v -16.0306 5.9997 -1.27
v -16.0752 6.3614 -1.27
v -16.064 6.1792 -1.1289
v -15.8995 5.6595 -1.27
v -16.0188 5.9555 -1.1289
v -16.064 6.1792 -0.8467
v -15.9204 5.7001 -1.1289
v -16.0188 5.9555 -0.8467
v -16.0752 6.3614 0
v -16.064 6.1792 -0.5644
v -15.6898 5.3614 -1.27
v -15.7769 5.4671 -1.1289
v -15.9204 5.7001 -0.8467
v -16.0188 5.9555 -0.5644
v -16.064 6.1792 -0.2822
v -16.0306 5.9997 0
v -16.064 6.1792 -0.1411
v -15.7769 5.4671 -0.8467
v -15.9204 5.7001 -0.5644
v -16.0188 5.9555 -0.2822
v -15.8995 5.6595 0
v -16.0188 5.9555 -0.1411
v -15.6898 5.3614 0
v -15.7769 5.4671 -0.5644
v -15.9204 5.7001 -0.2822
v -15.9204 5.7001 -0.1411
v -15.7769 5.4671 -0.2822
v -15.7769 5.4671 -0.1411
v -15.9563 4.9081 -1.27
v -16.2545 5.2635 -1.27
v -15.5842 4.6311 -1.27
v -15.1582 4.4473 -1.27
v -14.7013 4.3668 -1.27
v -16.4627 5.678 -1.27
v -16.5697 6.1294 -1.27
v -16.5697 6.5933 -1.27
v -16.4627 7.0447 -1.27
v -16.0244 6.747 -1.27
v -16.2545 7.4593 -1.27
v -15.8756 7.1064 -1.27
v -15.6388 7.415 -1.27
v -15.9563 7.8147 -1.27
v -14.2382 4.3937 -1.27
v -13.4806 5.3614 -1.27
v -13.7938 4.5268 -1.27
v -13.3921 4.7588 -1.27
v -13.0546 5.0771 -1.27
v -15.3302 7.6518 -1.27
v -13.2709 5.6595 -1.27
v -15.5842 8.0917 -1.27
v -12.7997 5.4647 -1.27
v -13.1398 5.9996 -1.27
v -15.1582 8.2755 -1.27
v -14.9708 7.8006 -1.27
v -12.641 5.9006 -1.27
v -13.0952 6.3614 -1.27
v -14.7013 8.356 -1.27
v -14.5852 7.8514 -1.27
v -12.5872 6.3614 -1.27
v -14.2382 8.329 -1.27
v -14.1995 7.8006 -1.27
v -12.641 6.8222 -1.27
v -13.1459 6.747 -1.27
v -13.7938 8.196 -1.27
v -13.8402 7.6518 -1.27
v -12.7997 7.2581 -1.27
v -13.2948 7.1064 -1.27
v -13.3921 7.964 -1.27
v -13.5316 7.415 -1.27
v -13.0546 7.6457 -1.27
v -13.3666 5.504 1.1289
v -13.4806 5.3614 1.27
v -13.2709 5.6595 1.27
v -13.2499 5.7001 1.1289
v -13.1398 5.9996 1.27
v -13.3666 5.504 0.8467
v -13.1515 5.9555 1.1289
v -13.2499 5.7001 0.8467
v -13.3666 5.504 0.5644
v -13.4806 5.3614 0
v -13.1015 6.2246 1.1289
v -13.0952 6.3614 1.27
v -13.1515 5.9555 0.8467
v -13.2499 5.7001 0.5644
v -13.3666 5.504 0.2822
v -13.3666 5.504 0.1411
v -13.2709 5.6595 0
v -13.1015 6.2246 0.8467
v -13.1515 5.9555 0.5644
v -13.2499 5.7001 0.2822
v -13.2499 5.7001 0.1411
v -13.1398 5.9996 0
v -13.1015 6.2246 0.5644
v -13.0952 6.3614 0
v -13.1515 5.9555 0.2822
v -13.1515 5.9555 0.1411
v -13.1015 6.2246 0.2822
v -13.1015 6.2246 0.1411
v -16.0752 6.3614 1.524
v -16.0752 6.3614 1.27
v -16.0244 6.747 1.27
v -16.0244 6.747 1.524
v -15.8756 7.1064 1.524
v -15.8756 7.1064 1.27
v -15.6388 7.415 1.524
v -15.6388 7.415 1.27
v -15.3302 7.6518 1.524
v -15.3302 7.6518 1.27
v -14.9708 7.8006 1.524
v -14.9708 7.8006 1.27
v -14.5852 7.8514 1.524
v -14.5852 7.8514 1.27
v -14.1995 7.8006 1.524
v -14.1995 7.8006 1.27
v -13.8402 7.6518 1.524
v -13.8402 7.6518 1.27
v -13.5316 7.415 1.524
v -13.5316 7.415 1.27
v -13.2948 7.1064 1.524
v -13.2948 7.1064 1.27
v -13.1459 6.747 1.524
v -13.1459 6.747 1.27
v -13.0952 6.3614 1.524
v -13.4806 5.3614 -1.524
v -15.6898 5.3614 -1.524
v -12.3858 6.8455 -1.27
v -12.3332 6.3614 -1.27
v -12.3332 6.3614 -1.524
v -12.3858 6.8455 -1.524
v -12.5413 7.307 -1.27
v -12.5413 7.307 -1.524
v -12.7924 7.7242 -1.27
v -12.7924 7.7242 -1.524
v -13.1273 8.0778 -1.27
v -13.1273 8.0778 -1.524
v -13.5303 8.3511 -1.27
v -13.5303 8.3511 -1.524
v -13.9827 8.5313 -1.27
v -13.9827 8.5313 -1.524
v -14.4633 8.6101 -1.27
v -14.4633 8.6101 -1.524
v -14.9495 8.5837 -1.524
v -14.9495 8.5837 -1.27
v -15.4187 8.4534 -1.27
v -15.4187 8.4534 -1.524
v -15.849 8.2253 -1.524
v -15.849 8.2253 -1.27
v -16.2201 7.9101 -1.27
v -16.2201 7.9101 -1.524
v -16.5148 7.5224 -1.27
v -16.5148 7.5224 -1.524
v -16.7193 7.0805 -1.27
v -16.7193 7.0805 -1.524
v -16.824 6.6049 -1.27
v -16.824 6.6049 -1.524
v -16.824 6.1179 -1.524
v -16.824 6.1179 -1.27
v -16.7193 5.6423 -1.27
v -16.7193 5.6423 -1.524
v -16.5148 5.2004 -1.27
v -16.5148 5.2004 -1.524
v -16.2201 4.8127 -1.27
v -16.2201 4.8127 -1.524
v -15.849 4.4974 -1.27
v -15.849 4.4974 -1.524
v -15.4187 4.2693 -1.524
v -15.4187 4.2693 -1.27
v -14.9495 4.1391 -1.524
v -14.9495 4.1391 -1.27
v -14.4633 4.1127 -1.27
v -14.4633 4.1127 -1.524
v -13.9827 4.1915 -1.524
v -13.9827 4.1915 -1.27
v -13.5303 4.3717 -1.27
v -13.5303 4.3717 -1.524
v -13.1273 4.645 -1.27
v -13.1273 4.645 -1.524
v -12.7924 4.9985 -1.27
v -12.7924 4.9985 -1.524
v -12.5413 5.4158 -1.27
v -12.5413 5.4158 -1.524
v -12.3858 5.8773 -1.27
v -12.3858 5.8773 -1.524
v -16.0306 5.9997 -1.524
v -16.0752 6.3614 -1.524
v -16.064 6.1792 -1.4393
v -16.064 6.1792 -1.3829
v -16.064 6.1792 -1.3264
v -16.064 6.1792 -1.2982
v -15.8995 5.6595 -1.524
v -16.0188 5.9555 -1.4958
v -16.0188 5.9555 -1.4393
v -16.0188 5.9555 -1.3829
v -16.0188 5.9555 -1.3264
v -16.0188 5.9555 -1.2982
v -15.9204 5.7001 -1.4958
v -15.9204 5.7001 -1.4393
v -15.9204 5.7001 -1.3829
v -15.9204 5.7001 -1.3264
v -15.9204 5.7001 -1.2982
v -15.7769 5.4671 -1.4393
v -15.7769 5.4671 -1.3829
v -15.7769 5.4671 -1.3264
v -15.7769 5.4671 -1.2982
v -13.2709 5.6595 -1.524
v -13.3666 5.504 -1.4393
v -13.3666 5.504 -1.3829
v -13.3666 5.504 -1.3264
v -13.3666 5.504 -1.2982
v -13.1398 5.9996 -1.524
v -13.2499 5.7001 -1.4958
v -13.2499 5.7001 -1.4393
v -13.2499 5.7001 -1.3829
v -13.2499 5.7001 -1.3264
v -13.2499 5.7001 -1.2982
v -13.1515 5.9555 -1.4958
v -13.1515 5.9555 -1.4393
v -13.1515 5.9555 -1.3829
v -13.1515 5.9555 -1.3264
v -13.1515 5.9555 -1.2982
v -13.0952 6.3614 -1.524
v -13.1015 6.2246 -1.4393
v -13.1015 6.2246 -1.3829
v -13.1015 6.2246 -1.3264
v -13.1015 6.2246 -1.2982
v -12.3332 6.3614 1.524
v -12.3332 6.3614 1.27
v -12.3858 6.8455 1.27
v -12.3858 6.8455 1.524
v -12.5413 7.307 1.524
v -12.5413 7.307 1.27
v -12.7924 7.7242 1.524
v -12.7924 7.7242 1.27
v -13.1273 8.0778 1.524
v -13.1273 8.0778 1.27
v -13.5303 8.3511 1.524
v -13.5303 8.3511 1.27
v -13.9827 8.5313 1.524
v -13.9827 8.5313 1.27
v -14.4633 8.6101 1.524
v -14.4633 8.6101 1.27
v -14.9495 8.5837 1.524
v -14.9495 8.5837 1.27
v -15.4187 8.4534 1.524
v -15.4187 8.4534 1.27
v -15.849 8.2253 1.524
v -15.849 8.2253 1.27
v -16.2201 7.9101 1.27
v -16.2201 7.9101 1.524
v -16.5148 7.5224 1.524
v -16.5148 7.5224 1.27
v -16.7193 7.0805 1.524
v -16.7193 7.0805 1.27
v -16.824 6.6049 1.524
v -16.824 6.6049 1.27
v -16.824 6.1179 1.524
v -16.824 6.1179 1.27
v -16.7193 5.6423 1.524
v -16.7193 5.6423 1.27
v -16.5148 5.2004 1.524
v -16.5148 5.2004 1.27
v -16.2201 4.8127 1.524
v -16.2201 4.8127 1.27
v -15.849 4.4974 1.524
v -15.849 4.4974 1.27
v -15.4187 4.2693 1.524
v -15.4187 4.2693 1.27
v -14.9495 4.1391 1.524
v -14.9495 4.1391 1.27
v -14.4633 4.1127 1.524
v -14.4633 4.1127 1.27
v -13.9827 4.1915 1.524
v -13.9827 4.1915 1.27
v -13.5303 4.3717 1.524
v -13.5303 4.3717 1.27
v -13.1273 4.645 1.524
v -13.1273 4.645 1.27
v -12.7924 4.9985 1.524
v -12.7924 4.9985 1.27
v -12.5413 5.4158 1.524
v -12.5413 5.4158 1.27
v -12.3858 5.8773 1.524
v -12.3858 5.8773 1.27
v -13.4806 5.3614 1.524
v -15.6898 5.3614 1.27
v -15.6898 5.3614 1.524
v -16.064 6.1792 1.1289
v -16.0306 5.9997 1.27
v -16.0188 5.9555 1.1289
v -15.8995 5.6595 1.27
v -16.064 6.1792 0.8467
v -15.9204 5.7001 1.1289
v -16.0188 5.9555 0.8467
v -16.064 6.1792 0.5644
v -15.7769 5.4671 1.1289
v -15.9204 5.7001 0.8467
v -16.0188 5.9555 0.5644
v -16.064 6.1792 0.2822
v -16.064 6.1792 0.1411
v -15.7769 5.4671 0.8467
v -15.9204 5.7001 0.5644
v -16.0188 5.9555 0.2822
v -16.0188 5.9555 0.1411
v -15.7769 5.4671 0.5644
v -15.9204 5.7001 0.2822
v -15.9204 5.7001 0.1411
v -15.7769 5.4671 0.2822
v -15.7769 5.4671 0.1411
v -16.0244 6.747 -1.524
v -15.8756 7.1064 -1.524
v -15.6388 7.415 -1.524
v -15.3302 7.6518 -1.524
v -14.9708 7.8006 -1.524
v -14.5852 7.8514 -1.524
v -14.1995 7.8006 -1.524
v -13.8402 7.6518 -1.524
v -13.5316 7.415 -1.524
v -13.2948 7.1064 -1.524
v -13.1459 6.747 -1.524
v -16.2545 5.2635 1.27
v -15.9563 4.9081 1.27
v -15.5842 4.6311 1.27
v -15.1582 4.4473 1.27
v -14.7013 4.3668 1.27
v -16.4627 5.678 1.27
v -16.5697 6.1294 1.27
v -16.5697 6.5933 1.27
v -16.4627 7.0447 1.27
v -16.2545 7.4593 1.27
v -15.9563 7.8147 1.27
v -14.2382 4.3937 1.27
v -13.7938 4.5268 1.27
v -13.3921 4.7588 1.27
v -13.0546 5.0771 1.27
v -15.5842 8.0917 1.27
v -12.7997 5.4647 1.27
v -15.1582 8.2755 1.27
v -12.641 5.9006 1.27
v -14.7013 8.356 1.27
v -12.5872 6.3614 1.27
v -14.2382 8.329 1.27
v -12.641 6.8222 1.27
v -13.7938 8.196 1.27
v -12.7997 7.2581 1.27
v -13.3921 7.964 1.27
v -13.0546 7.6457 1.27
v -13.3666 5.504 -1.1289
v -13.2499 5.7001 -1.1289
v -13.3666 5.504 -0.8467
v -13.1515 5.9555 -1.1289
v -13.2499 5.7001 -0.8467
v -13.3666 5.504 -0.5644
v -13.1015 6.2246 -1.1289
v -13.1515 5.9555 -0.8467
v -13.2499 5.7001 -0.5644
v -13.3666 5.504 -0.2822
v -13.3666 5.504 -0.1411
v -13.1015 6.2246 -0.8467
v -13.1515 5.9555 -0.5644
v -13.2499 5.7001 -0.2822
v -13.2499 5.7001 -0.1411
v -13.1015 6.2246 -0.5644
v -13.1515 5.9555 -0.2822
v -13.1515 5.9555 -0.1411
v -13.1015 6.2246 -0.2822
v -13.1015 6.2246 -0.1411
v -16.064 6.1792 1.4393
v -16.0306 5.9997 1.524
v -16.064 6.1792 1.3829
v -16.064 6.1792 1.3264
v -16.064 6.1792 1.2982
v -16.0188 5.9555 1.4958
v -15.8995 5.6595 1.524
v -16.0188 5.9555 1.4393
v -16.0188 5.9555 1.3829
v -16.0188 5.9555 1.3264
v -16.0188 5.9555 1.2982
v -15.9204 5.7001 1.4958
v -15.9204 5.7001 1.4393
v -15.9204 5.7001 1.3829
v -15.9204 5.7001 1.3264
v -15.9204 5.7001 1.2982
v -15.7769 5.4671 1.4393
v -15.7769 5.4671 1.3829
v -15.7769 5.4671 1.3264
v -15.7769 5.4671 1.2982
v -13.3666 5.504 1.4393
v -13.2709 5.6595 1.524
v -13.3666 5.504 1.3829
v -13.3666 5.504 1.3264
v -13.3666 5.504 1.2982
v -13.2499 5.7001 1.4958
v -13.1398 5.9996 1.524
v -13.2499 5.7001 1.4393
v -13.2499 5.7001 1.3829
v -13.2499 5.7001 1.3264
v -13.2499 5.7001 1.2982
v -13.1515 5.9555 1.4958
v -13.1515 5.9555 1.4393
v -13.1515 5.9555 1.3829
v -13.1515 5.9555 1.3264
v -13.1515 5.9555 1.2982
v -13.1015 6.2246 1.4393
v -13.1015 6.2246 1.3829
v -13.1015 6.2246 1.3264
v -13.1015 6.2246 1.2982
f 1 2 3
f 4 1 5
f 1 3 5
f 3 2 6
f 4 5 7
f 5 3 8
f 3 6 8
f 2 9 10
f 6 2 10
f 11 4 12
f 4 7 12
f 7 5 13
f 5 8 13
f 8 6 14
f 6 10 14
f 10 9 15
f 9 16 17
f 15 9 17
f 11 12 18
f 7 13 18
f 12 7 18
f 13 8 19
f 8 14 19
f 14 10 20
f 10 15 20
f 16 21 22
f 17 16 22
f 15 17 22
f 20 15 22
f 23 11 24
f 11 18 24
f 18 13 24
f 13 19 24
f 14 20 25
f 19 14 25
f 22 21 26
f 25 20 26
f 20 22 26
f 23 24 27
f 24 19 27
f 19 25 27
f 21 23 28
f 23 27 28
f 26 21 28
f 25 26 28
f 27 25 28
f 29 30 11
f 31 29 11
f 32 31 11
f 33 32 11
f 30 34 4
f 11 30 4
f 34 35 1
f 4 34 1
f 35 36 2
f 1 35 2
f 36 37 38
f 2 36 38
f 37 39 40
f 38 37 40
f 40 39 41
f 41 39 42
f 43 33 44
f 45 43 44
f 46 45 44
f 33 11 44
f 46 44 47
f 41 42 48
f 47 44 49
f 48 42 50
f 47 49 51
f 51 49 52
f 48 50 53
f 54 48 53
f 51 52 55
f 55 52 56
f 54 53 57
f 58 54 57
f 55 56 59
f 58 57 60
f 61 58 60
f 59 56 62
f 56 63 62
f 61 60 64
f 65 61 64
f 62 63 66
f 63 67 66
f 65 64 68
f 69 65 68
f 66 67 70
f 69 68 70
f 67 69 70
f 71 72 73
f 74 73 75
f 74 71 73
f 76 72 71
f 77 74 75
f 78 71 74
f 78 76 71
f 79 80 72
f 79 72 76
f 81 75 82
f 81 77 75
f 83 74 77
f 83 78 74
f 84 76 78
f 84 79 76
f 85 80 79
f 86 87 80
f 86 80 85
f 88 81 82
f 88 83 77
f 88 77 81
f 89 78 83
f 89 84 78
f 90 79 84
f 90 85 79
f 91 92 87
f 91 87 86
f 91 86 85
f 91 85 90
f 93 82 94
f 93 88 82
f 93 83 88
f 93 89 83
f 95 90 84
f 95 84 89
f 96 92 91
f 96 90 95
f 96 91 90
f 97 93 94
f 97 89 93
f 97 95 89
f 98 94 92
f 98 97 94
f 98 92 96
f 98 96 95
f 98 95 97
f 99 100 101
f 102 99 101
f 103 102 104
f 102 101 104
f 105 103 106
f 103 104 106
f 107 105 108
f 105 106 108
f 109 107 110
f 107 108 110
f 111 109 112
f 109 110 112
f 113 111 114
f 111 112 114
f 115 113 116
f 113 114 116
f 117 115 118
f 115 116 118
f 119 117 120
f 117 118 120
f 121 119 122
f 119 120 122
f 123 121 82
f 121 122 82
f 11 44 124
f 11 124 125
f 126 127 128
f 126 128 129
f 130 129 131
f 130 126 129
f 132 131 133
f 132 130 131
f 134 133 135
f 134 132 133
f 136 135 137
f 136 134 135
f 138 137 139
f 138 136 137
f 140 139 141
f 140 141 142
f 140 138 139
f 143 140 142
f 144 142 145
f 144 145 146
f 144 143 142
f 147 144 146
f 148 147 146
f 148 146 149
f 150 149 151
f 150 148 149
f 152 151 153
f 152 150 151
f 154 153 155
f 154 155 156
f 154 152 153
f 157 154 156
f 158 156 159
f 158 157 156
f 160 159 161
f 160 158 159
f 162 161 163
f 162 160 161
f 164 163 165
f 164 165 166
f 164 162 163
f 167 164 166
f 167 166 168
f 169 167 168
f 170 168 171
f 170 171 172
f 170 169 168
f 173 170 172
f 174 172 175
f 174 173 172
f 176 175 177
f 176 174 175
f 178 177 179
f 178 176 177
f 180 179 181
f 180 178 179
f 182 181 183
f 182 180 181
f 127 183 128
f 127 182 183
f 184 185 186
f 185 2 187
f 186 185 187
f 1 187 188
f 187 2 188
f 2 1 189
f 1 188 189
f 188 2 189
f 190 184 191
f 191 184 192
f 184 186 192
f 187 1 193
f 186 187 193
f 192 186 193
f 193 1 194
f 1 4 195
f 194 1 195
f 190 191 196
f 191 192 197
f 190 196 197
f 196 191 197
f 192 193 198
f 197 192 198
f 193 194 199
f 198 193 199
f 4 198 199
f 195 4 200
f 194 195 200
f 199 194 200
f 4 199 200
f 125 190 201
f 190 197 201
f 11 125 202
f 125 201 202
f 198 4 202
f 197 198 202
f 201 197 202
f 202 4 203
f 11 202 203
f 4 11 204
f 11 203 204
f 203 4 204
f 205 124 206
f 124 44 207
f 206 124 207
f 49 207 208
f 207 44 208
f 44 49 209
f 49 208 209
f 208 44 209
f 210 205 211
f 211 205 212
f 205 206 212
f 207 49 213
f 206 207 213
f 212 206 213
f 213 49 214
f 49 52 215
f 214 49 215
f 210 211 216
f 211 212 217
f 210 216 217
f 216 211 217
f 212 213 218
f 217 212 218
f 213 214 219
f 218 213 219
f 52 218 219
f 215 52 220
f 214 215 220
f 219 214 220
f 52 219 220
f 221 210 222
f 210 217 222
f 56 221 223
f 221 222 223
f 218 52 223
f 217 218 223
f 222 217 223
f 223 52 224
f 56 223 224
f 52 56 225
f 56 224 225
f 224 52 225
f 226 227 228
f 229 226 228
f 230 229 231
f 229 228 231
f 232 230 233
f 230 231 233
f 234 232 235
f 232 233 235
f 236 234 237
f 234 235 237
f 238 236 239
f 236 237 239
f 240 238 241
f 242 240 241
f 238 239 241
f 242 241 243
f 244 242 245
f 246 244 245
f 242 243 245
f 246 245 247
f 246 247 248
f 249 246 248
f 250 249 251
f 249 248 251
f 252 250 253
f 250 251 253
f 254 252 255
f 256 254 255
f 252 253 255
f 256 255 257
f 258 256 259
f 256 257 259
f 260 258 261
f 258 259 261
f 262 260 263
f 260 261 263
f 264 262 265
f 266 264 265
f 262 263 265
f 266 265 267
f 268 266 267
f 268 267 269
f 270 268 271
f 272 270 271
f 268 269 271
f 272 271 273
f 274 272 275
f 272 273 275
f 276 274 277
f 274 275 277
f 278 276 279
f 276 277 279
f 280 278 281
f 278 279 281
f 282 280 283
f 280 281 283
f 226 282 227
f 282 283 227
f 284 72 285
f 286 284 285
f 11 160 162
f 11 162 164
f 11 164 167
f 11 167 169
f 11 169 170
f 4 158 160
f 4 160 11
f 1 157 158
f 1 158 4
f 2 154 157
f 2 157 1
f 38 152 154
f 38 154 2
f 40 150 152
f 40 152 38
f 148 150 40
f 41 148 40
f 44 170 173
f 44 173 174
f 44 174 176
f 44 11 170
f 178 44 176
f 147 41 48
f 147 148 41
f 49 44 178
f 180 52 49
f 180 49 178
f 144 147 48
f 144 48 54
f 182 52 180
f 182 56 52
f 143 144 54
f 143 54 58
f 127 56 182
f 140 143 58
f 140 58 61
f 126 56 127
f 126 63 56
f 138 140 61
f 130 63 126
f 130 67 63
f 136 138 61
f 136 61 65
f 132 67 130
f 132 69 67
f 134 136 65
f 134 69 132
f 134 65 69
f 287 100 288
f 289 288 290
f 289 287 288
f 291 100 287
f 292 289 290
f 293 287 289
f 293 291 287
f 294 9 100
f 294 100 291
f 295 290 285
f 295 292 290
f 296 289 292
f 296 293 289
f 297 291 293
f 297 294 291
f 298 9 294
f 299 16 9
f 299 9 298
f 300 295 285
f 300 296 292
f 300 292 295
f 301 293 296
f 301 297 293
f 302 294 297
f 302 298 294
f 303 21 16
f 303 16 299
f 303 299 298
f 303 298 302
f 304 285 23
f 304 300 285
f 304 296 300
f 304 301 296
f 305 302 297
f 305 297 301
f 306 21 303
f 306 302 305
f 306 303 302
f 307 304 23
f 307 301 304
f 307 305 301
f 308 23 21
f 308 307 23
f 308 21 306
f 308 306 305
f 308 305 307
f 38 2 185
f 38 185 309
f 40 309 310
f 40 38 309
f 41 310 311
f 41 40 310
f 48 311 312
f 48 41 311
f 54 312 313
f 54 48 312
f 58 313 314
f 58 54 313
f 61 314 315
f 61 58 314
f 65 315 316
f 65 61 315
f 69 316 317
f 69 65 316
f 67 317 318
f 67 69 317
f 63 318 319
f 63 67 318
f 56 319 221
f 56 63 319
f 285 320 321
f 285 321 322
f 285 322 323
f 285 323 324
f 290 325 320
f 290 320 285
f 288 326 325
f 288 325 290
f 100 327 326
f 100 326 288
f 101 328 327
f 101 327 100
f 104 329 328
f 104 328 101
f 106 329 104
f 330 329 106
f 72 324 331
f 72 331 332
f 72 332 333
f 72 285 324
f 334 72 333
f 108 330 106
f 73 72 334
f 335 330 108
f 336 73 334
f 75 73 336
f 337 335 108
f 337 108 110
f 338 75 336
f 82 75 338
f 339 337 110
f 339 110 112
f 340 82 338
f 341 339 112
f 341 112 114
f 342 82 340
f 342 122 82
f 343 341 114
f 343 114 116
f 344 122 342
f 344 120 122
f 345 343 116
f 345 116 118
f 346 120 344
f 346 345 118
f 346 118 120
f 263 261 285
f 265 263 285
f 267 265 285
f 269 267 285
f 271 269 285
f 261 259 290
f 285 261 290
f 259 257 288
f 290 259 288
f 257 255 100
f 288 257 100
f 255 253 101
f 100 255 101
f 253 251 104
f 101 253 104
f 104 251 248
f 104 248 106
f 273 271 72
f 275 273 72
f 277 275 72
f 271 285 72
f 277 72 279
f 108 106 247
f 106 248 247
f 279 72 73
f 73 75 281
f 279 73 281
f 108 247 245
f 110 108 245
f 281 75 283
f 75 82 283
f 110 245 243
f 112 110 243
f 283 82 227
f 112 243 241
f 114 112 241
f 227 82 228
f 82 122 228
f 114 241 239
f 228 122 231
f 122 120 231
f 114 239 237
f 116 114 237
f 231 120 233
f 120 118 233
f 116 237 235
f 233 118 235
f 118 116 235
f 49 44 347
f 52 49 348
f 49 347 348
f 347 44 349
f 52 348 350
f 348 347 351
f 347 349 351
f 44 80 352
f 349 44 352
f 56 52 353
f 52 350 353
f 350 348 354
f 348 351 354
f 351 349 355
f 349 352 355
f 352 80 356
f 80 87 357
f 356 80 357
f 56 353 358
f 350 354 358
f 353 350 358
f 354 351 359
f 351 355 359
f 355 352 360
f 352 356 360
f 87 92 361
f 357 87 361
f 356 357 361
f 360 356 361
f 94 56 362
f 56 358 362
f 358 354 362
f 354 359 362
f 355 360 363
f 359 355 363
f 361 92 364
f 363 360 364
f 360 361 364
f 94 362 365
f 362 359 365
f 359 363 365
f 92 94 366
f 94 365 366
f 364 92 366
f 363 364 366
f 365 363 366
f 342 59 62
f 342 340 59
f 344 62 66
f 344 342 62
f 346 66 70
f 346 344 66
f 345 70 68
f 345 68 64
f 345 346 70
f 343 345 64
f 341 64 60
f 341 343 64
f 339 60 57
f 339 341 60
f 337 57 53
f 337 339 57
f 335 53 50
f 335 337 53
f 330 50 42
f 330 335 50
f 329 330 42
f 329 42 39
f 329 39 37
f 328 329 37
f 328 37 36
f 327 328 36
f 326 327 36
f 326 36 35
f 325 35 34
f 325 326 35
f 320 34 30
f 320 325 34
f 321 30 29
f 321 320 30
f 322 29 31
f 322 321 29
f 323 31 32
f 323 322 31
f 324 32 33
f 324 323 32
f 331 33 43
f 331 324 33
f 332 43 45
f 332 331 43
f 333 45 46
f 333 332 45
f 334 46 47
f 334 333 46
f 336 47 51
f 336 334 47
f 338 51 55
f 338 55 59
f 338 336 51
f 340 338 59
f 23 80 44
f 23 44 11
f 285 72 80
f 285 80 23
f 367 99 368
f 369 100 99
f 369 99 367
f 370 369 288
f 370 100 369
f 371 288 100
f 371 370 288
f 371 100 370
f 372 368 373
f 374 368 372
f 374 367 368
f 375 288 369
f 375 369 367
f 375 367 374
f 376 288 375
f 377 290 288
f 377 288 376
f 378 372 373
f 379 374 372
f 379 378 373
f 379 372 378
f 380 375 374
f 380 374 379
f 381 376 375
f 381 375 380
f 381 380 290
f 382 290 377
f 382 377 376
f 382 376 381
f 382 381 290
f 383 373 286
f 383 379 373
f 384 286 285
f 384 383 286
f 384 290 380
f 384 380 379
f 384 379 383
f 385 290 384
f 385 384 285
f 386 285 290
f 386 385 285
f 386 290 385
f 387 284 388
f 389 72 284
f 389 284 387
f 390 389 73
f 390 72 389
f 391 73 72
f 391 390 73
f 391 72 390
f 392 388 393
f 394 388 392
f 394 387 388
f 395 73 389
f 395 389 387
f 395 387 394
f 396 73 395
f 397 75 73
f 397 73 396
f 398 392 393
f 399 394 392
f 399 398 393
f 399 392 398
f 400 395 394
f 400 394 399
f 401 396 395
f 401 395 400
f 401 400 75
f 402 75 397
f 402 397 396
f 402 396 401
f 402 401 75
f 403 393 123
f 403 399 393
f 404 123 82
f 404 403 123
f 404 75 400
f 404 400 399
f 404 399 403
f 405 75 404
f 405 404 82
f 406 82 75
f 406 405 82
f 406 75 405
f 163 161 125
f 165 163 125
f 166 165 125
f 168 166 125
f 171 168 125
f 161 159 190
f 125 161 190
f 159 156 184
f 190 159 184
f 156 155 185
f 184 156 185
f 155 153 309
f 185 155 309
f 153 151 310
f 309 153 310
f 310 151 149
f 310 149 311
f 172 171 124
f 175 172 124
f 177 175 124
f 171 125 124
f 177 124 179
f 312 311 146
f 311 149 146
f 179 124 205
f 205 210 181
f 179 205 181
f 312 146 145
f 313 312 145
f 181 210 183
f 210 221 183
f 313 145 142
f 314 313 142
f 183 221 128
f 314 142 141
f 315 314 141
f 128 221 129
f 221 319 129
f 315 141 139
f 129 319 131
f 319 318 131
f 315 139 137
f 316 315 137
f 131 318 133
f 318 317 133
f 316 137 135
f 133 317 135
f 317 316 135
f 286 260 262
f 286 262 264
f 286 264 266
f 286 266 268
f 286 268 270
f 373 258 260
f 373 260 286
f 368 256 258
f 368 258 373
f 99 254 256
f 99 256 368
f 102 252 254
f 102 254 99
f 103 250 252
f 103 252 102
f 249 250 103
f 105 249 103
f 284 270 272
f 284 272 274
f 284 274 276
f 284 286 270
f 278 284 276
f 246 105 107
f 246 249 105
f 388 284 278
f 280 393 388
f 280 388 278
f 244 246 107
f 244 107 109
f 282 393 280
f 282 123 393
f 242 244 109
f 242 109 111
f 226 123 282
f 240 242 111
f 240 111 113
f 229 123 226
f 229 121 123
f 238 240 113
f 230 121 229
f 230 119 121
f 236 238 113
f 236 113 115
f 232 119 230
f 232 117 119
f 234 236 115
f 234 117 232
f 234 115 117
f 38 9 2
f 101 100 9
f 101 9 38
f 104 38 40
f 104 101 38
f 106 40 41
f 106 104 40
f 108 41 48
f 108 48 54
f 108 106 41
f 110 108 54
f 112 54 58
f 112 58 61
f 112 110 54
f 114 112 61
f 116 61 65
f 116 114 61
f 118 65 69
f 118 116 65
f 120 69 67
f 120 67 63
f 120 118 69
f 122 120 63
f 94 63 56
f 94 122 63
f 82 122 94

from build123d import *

# Parameters (mm, degrees)
SKETCH1_R           = 1.997999999
BOSS_EXTRUDE1_DEPTH = 1.27
BOSS_EXTRUDE2_START = 1.27
SKETCH1_5_R         = 2.251999999
BOSS_EXTRUDE2_DEPTH = 0.254


with BuildPart() as part:
    # Sketch1 → Boss-Extrude1 (new, symmetric)
    with BuildSketch(Plane.XY):
        with Locations((-14.585173992, 6.361392546)):
            Circle(SKETCH1_R)
        with BuildLine():
            Line((-13.480592623, 5.361392545), (-15.689755361, 5.361392545))
            add(Edge.make_bspline(
                [(-16.075173991, 6.361392546), (-16.074638254, 6.330921531), (-16.073567789, 6.270036937), (-16.064859774, 6.179022479), (-16.04865674, 6.073679037), (-16.020862372, 5.954905457), (-15.977427672, 5.824797796), (-15.922333529, 5.699149352), (-15.85569141, 5.579296345), (-15.779043389, 5.46540879), (-15.719518037, 5.396064627), (-15.689755361, 5.361392545)],
                knots=[0, 0, 0, 0, 0.083397986, 0.166638774, 0.25003676, 0.375030634, 0.500024507, 0.62501838, 0.750012253, 0.875006126, 1, 1, 1, 1], degree=3))
            ThreePointArc((-16.075173991, 6.361392546), (-14.585173992, 7.851392545), (-13.095173993, 6.361392546))
            add(Edge.make_bspline(
                [(-13.480592623, 5.361392545), (-13.460539436, 5.384341171), (-13.420470859, 5.430195167), (-13.365842841, 5.503511201), (-13.307154336, 5.59247995), (-13.248045319, 5.69918428), (-13.192924177, 5.824787769), (-13.14943929, 5.954910636), (-13.118404819, 6.088487495), (-13.098791679, 6.224357356), (-13.096379888, 6.315714149), (-13.095173993, 6.361392546)],
                knots=[0, 0, 0, 0, 0.083397986, 0.166638776, 0.250036761, 0.375030634, 0.500024507, 0.62501838, 0.750012254, 0.875006127, 1, 1, 1, 1], degree=3))
        make_face(mode=Mode.SUBTRACT)
    extrude(amount=BOSS_EXTRUDE1_DEPTH, both=True)


with BuildPart() as body_2:
    # Sketch1<5> → Boss-Extrude2 (new body)
    with BuildSketch(Plane.XY.offset(BOSS_EXTRUDE2_START)):
        with Locations((-14.585173992, 6.361392546)):
            Circle(SKETCH1_5_R)
        with BuildLine():
            Line((-13.480592623, 5.361392545), (-15.689755361, 5.361392545))
            add(Edge.make_bspline(
                [(-16.075173991, 6.361392546), (-16.074638254, 6.330921531), (-16.073567789, 6.270036937), (-16.064859774, 6.179022479), (-16.04865674, 6.073679037), (-16.020862372, 5.954905457), (-15.977427672, 5.824797796), (-15.922333529, 5.699149352), (-15.85569141, 5.579296345), (-15.779043389, 5.46540879), (-15.719518037, 5.396064627), (-15.689755361, 5.361392545)],
                knots=[0, 0, 0, 0, 0.083397986, 0.166638774, 0.25003676, 0.375030634, 0.500024507, 0.62501838, 0.750012253, 0.875006126, 1, 1, 1, 1], degree=3))
            ThreePointArc((-16.075173991, 6.361392546), (-14.585173992, 7.851392545), (-13.095173993, 6.361392546))
            add(Edge.make_bspline(
                [(-13.480592623, 5.361392545), (-13.460539436, 5.384341171), (-13.420470859, 5.430195167), (-13.365842841, 5.503511201), (-13.307154336, 5.59247995), (-13.248045319, 5.69918428), (-13.192924177, 5.824787769), (-13.14943929, 5.954910636), (-13.118404819, 6.088487495), (-13.098791679, 6.224357356), (-13.096379888, 6.315714149), (-13.095173993, 6.361392546)],
                knots=[0, 0, 0, 0, 0.083397986, 0.166638776, 0.250036761, 0.375030634, 0.500024507, 0.62501838, 0.750012254, 0.875006127, 1, 1, 1, 1], degree=3))
        make_face(mode=Mode.SUBTRACT)
    extrude(amount=BOSS_EXTRUDE2_DEPTH)


with BuildPart() as body_3:
    # Mirror2: mirrored copy
    add(body_2.part.mirror(Plane.XY))


solid = Compound([part.part, body_2.part, body_3.part])
